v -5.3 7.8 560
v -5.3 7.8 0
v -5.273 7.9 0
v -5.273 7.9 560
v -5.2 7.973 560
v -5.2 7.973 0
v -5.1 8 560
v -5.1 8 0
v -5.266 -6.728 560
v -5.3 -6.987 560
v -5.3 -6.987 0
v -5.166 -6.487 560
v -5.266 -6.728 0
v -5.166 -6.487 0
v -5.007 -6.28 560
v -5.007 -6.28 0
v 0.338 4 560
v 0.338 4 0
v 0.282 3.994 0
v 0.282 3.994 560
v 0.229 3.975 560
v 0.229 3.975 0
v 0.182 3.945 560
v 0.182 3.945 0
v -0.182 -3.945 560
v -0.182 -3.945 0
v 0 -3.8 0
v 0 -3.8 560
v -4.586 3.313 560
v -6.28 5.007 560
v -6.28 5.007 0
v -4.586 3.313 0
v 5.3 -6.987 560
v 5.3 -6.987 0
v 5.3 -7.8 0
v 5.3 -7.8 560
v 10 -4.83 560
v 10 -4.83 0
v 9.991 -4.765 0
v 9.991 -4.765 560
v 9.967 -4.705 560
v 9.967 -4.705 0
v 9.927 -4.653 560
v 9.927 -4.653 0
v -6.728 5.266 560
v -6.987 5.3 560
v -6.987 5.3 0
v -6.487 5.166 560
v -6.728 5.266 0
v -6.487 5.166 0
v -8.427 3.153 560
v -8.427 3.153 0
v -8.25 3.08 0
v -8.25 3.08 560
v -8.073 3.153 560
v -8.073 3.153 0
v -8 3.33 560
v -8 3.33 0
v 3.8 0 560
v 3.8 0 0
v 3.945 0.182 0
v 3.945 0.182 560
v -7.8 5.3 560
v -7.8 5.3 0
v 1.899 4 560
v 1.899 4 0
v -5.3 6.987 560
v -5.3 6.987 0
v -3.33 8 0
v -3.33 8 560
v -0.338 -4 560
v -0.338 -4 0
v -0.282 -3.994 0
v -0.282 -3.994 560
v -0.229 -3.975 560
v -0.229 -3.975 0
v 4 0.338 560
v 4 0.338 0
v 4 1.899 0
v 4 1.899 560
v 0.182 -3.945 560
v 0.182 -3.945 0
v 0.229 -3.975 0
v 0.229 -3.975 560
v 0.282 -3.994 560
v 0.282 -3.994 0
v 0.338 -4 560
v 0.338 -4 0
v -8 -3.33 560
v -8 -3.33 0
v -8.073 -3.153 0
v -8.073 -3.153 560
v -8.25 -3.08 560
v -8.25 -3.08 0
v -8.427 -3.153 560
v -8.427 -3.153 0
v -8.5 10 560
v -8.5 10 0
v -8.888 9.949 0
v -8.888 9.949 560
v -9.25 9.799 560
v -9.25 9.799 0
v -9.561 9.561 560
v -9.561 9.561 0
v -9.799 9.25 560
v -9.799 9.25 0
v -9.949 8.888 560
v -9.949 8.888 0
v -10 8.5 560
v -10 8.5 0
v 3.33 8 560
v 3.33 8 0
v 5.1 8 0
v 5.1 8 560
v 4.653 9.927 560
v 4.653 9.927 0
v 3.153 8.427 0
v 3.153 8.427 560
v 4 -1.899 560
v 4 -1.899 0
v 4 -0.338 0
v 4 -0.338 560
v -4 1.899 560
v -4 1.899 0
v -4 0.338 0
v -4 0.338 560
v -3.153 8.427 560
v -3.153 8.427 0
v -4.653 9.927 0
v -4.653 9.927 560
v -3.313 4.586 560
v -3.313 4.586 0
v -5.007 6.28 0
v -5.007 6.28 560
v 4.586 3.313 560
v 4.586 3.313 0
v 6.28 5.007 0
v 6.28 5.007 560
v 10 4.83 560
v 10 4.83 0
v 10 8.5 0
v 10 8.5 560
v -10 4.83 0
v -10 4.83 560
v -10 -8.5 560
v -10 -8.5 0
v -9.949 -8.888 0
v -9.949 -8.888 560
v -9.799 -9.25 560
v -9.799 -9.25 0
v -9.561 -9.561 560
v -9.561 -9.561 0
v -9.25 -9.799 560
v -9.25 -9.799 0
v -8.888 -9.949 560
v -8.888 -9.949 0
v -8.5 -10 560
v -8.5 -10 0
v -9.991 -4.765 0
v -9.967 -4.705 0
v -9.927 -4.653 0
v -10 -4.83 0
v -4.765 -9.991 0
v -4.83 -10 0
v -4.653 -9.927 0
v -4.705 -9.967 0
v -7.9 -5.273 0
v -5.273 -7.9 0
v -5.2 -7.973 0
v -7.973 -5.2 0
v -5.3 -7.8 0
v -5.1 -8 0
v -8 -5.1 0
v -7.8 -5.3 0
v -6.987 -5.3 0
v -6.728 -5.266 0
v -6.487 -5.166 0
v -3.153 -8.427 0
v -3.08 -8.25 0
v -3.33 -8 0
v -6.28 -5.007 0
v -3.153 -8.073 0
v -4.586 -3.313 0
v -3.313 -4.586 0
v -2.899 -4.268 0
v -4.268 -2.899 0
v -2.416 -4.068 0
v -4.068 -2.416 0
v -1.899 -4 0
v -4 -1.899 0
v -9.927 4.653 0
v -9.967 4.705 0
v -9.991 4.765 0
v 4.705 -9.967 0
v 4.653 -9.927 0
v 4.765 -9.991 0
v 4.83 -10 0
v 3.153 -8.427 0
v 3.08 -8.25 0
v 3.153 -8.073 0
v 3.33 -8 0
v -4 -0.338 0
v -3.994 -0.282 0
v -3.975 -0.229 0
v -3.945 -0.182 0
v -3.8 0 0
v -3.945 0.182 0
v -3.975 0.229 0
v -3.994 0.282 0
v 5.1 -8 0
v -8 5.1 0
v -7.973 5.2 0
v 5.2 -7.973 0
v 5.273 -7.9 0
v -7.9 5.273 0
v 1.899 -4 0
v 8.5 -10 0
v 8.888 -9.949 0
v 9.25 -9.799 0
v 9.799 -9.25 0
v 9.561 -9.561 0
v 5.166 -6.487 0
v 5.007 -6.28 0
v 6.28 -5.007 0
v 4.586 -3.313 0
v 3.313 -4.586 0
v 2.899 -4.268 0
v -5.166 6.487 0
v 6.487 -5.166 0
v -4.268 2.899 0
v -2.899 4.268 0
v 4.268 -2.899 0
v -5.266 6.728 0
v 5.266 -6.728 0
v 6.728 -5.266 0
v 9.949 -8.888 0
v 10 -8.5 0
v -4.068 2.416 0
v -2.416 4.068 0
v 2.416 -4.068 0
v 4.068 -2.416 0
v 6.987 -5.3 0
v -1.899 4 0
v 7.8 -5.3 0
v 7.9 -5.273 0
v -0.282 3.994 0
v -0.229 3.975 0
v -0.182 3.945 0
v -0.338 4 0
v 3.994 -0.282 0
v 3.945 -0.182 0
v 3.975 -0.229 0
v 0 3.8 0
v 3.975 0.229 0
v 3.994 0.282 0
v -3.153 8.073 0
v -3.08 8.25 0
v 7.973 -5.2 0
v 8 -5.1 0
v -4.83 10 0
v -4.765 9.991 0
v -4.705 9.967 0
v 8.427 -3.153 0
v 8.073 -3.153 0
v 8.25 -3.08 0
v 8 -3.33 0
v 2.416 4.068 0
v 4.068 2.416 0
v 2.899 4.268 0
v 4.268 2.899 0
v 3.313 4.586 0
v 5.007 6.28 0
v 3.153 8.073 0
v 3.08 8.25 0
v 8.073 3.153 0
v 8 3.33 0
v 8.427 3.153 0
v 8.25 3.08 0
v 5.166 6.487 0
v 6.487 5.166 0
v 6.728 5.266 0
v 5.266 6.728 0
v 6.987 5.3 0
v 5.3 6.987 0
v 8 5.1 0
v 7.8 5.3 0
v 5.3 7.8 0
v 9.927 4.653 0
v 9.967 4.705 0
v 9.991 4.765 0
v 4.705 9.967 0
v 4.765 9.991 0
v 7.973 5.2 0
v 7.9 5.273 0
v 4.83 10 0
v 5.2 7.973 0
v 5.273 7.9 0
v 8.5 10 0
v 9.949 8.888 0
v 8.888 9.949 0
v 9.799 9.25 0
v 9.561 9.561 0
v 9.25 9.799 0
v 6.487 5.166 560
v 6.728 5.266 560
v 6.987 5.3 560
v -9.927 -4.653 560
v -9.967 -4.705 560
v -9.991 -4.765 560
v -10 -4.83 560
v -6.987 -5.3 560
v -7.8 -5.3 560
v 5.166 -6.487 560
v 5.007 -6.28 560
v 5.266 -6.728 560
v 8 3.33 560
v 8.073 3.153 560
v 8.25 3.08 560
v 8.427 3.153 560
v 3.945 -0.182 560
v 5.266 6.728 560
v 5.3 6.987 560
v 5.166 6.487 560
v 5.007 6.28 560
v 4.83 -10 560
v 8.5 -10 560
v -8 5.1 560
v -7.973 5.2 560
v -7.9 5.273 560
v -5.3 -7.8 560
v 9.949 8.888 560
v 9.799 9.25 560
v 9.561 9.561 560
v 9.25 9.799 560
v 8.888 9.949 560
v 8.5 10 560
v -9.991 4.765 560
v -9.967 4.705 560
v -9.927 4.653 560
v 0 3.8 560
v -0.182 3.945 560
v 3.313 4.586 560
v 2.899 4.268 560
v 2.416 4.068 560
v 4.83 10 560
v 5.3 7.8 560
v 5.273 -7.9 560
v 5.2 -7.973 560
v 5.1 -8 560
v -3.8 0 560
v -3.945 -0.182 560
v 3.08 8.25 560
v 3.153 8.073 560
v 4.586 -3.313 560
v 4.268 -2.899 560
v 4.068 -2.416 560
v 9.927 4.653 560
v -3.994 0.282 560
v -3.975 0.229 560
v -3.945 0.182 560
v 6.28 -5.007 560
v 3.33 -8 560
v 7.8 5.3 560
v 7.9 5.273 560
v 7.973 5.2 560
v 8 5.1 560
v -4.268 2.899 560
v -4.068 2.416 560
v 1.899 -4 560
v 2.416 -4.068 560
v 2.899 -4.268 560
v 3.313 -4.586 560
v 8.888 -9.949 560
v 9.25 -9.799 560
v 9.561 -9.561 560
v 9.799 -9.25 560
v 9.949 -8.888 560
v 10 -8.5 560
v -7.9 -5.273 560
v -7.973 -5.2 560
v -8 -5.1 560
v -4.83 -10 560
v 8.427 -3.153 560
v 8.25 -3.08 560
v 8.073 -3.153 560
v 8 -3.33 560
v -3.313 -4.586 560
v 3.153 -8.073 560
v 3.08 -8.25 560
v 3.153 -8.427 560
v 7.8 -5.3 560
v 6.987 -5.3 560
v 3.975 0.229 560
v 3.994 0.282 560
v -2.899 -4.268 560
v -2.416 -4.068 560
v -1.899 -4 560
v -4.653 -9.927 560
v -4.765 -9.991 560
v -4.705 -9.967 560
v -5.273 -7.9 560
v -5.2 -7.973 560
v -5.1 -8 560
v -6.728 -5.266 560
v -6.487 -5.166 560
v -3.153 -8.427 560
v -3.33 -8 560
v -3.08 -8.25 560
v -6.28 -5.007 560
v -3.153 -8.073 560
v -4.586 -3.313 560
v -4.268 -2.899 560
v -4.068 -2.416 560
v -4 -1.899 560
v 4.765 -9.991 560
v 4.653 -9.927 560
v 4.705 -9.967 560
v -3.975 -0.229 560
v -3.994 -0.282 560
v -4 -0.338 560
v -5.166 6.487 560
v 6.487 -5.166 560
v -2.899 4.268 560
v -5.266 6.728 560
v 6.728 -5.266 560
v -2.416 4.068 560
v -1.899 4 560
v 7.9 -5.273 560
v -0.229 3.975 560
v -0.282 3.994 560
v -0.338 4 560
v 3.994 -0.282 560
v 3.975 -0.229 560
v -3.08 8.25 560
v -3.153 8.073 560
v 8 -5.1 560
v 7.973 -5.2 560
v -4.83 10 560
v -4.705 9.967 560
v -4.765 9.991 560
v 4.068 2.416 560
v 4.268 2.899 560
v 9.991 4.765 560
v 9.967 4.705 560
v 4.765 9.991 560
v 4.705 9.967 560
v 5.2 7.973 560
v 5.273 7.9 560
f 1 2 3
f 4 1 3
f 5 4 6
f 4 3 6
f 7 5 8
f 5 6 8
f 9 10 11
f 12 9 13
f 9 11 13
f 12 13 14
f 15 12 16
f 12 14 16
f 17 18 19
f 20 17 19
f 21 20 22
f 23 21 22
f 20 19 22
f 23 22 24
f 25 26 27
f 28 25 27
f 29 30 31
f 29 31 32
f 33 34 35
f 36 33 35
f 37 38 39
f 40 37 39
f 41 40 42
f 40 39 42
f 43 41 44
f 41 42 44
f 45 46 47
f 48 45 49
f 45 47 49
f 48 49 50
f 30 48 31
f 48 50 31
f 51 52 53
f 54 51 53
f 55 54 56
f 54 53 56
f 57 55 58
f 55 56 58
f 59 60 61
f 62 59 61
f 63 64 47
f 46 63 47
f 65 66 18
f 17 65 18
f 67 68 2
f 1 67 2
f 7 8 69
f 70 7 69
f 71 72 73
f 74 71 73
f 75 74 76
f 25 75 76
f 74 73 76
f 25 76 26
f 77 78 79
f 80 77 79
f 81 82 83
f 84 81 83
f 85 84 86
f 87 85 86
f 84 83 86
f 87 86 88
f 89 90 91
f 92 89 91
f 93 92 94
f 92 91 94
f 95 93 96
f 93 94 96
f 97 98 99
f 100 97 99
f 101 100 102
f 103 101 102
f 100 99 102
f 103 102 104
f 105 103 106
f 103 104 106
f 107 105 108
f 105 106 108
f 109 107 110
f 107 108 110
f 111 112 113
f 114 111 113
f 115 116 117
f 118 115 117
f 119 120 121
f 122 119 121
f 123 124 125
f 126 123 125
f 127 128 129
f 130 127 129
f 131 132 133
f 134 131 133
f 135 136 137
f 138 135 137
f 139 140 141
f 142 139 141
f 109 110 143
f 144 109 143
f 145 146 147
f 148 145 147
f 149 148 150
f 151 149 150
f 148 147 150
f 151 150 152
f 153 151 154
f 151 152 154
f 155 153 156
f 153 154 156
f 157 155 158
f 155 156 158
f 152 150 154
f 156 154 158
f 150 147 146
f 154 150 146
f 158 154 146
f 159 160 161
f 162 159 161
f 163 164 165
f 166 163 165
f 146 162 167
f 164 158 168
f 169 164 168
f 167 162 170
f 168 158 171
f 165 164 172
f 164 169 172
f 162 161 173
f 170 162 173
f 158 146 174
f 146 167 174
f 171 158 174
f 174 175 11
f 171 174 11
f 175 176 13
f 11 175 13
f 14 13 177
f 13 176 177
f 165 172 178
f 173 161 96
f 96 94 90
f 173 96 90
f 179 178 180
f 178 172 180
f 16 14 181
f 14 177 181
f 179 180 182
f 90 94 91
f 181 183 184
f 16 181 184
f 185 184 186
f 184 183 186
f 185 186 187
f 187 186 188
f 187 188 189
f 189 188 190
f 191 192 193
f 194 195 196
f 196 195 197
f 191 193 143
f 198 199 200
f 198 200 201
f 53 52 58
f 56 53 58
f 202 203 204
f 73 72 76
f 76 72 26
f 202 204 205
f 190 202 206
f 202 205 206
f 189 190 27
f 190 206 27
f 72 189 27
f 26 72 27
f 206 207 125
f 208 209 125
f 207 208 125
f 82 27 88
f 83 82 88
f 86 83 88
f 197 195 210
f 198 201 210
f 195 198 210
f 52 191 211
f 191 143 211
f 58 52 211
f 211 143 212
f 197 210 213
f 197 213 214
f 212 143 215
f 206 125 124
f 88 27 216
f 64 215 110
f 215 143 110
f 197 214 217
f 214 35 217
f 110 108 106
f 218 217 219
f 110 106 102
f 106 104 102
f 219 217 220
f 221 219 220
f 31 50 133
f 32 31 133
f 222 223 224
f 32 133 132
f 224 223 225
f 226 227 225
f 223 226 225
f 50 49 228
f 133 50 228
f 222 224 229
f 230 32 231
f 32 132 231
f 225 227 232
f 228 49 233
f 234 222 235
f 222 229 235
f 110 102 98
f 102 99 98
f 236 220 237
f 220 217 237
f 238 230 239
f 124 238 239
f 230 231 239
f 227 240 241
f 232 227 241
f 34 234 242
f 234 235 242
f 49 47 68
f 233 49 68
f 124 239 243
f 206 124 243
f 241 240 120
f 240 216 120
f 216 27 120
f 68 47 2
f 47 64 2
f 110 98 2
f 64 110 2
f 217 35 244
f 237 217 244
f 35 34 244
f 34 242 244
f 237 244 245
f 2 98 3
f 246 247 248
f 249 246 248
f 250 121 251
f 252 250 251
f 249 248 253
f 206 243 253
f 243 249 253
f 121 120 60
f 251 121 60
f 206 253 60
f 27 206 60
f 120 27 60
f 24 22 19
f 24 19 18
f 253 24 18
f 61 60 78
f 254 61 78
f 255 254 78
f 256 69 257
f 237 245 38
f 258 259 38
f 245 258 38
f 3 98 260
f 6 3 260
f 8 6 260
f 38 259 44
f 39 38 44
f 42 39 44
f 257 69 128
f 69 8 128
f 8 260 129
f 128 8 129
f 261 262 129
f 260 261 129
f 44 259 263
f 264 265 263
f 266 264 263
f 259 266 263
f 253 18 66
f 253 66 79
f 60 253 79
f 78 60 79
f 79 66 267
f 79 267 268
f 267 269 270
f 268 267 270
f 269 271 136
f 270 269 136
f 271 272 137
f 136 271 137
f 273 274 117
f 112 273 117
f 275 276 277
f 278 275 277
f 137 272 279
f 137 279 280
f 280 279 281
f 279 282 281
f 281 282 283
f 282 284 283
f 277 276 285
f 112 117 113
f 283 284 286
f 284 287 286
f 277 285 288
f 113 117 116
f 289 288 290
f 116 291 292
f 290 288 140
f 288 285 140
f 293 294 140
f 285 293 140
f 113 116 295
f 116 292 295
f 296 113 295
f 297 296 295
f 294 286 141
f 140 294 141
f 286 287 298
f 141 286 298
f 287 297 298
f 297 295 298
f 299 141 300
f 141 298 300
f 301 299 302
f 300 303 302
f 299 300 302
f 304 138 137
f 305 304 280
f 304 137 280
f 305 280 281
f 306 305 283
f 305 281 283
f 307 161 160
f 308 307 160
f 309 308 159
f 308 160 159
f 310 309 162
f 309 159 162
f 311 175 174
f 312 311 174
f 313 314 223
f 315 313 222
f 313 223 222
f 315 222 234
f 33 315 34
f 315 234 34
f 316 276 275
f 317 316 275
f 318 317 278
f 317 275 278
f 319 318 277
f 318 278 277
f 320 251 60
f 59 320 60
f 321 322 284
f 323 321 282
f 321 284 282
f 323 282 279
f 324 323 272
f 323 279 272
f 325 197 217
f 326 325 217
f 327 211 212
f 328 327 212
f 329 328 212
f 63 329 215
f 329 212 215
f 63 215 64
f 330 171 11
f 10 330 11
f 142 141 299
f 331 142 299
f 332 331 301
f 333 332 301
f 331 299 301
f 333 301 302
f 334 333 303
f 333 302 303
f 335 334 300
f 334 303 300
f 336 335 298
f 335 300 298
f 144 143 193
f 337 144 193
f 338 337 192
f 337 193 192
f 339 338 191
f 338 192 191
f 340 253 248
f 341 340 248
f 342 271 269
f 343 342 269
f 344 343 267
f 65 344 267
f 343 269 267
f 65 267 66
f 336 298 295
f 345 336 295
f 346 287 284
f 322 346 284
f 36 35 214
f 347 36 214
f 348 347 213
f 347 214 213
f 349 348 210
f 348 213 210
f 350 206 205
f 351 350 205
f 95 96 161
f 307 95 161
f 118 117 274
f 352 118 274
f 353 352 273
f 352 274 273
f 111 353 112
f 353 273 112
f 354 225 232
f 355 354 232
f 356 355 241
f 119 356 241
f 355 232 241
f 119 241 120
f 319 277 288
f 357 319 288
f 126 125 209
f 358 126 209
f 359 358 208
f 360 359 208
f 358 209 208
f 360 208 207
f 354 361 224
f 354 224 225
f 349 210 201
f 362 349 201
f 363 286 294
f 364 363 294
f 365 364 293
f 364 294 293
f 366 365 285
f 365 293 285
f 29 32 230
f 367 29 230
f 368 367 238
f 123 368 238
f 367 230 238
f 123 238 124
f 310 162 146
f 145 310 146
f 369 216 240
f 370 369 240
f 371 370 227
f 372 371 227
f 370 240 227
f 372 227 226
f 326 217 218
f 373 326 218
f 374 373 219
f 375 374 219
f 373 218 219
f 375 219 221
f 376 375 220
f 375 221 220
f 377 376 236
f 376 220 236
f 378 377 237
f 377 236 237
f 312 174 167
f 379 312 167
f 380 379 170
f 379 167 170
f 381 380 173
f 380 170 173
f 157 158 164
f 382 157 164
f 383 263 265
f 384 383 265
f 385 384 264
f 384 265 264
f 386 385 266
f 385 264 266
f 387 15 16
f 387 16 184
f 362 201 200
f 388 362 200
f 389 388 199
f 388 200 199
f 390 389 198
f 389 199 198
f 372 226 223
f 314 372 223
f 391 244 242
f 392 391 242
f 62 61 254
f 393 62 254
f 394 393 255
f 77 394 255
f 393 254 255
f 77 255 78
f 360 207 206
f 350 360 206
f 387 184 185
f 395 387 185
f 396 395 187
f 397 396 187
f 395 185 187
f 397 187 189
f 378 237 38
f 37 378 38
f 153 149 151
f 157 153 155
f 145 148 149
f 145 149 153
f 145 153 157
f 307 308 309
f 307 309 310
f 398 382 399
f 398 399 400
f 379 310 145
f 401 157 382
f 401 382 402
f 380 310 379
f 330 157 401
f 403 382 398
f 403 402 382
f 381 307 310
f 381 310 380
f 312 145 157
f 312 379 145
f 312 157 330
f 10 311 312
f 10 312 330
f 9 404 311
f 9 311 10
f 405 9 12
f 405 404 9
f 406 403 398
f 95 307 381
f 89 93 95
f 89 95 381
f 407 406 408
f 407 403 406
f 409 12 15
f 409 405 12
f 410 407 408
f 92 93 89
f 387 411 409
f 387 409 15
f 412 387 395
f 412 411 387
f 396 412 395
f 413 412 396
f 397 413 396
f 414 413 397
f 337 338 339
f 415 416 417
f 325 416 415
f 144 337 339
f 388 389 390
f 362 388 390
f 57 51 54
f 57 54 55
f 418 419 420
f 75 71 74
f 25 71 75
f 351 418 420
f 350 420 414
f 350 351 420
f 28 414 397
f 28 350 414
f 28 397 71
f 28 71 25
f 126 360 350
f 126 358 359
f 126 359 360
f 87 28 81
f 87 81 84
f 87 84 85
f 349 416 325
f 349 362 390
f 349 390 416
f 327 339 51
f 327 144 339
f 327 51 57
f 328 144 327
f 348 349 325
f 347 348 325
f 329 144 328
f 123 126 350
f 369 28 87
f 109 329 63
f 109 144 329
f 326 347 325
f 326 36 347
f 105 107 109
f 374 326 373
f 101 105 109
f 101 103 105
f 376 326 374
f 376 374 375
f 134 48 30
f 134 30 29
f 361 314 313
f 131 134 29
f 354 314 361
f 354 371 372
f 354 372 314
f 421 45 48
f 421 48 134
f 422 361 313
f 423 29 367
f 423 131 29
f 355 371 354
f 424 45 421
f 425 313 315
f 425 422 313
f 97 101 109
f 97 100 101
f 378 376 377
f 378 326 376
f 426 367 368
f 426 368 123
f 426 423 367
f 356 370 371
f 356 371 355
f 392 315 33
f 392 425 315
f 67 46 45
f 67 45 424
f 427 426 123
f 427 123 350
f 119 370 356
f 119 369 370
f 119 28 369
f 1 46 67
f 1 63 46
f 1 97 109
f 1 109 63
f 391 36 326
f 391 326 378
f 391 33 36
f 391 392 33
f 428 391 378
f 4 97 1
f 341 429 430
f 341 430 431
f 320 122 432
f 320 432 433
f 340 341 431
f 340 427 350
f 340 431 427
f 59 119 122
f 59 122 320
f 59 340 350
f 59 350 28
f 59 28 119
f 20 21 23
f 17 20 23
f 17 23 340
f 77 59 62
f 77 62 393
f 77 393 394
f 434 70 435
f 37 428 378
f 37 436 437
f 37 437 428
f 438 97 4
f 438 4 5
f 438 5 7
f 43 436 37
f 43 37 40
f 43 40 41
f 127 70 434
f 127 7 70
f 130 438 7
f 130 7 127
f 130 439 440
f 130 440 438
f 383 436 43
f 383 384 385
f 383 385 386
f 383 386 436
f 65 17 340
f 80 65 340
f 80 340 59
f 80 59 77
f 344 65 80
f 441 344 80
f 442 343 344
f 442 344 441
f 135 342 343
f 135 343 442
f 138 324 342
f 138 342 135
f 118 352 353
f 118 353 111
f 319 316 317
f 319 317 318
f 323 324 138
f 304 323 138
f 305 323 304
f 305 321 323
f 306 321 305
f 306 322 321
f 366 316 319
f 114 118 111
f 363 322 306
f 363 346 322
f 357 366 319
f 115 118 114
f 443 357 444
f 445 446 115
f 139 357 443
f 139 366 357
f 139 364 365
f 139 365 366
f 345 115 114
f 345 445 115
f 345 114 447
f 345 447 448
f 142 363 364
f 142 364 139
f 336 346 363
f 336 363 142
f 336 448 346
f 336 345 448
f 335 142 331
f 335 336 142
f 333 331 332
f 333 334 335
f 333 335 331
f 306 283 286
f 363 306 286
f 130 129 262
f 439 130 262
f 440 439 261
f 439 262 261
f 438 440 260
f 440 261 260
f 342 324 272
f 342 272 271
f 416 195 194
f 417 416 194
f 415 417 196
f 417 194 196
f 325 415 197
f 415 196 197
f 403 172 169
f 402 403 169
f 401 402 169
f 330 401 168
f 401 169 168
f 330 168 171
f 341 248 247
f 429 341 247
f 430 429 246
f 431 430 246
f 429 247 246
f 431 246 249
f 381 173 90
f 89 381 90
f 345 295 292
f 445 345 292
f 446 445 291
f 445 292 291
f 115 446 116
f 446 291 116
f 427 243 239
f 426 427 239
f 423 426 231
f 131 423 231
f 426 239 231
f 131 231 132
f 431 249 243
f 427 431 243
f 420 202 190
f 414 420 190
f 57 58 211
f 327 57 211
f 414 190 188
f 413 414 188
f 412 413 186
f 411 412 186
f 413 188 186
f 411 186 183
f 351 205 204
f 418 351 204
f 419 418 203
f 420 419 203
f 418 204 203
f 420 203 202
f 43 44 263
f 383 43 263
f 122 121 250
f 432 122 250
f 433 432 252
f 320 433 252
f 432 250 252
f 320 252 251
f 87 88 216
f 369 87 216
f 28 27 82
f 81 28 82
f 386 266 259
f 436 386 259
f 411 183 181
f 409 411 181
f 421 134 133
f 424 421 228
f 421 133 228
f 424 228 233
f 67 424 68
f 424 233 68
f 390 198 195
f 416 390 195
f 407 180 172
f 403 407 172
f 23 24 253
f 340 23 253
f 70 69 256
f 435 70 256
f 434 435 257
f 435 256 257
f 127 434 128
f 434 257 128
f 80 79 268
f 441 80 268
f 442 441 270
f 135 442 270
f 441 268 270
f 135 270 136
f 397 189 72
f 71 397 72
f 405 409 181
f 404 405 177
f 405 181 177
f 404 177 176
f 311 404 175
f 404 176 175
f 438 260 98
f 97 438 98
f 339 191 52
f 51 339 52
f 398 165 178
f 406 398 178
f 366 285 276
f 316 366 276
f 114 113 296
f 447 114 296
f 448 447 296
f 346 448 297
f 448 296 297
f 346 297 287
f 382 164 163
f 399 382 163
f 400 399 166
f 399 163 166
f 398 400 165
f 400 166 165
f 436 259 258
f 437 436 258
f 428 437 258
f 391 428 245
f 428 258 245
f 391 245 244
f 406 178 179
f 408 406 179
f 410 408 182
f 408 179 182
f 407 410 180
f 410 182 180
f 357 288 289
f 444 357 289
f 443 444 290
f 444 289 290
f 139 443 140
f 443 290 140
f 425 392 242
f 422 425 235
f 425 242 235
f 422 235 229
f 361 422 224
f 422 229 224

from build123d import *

# Parameters (mm, degrees)
EXTRUDE_1_DEPTH = 560


# Read off the part's stored shape, not the designer's step: 222 Конструкционный профиль 20х20-1-surface1
with BuildPart() as part:
    # Эскиз1 → Бобышка-Вытянуть1 (new body)
    with BuildSketch(Plane.XY):
        with BuildLine():
            Line((-3.945217202, 0.181521503), (-3.8, 0))
            Line((-3.8, 0), (-3.945217202, -0.181521503))
            ThreePointArc((-3.945217202, -0.181521503), (-3.98590708, -0.254943529), (-4, -0.337695265))
            Line((-4, -0.337695265), (-4, -1.898780669))
            ThreePointArc((-4, -1.898780669), (-4.152240935, -2.664147534), (-4.585786438, -3.312994231))
            Line((-4.585786438, -3.312994231), (-6.279898987, -5.007106781))
            ThreePointArc((-6.279898987, -5.007106781), (-6.604322336, -5.223879533), (-6.987005769, -5.3))
            Line((-6.987005769, -5.3), (-7.8, -5.3))
            ThreePointArc((-7.8, -5.3), (-7.941421356, -5.241421356), (-8, -5.1))
            Line((-8, -5.1), (-8, -3.33))
            ThreePointArc((-8, -3.33), (-8.154329142, -3.099030117), (-8.426776695, -3.153223305))
            Line((-8.426776695, -3.153223305), (-9.926776695, -4.653223305))
            ThreePointArc((-9.926776695, -4.653223305), (-9.980969883, -4.734329142), (-10, -4.83))
            Line((-10, -4.83), (-10, -8.5))
            ThreePointArc((-10, -8.5), (-9.560660172, -9.560660172), (-8.5, -10))
            Line((-8.5, -10), (-4.83, -10))
            ThreePointArc((-4.83, -10), (-4.734329142, -9.980969883), (-4.653223305, -9.926776695))
            Line((-4.653223305, -9.926776695), (-3.153223305, -8.426776695))
            ThreePointArc((-3.153223305, -8.426776695), (-3.099030117, -8.154329142), (-3.33, -8))
            Line((-3.33, -8), (-5.1, -8))
            ThreePointArc((-5.1, -8), (-5.241421356, -7.941421356), (-5.3, -7.8))
            Line((-5.3, -7.8), (-5.3, -6.987005769))
            ThreePointArc((-5.3, -6.987005769), (-5.223879533, -6.604322336), (-5.007106781, -6.279898987))
            Line((-5.007106781, -6.279898987), (-3.312994231, -4.585786438))
            ThreePointArc((-3.312994231, -4.585786438), (-2.664147534, -4.152240935), (-1.898780669, -4))
            Line((-1.898780669, -4), (-0.337695265, -4))
            ThreePointArc((-0.337695265, -4), (-0.254943529, -3.98590708), (-0.181521503, -3.945217202))
            Line((-0.181521503, -3.945217202), (0, -3.8))
            Line((0, -3.8), (0.181521503, -3.945217202))
            ThreePointArc((0.181521503, -3.945217202), (0.254943529, -3.98590708), (0.337695265, -4))
            Line((0.337695265, -4), (1.898780669, -4))
            ThreePointArc((1.898780669, -4), (2.664147534, -4.152240935), (3.312994231, -4.585786438))
            Line((3.312994231, -4.585786438), (5.007106781, -6.279898987))
            ThreePointArc((5.007106781, -6.279898987), (5.223879533, -6.604322336), (5.3, -6.987005769))
            Line((5.3, -6.987005769), (5.3, -7.8))
            ThreePointArc((5.3, -7.8), (5.241421356, -7.941421356), (5.1, -8))
            Line((5.1, -8), (3.33, -8))
            ThreePointArc((3.33, -8), (3.099030117, -8.154329142), (3.153223305, -8.426776695))
            Line((3.153223305, -8.426776695), (4.653223305, -9.926776695))
            ThreePointArc((4.653223305, -9.926776695), (4.734329142, -9.980969883), (4.83, -10))
            Line((4.83, -10), (8.5, -10))
            ThreePointArc((8.5, -10), (9.560660172, -9.560660172), (10, -8.5))
            Line((10, -8.5), (10, -4.83))
            ThreePointArc((10, -4.83), (9.980969883, -4.734329142), (9.926776695, -4.653223305))
            Line((9.926776695, -4.653223305), (8.426776695, -3.153223305))
            ThreePointArc((8.426776695, -3.153223305), (8.154329142, -3.099030117), (8, -3.33))
            Line((8, -3.33), (8, -5.1))
            ThreePointArc((8, -5.1), (7.941421356, -5.241421356), (7.8, -5.3))
            Line((7.8, -5.3), (6.987005769, -5.3))
            ThreePointArc((6.987005769, -5.3), (6.604322336, -5.223879533), (6.279898987, -5.007106781))
            Line((6.279898987, -5.007106781), (4.585786438, -3.312994231))
            ThreePointArc((4.585786438, -3.312994231), (4.152240935, -2.664147534), (4, -1.898780669))
            Line((4, -1.898780669), (4, -0.337695265))
            ThreePointArc((4, -0.337695265), (3.98590708, -0.254943529), (3.945217202, -0.181521503))
            Line((3.945217202, -0.181521503), (3.8, 0))
            Line((3.8, 0), (3.945217202, 0.181521503))
            ThreePointArc((3.945217202, 0.181521503), (3.98590708, 0.254943529), (4, 0.337695265))
            Line((4, 0.337695265), (4, 1.898780669))
            ThreePointArc((4, 1.898780669), (4.152240935, 2.664147534), (4.585786438, 3.312994231))
            Line((4.585786438, 3.312994231), (6.279898987, 5.007106781))
            ThreePointArc((6.279898987, 5.007106781), (6.604322336, 5.223879533), (6.987005769, 5.3))
            Line((6.987005769, 5.3), (7.8, 5.3))
            ThreePointArc((7.8, 5.3), (7.941421356, 5.241421356), (8, 5.1))
            Line((8, 5.1), (8, 3.33))
            ThreePointArc((8, 3.33), (8.154329142, 3.099030117), (8.426776695, 3.153223305))
            Line((8.426776695, 3.153223305), (9.926776695, 4.653223305))
            ThreePointArc((9.926776695, 4.653223305), (9.980969883, 4.734329142), (10, 4.83))
            Line((10, 4.83), (10, 8.5))
            ThreePointArc((10, 8.5), (9.560660172, 9.560660172), (8.5, 10))
            Line((8.5, 10), (4.83, 10))
            ThreePointArc((4.83, 10), (4.734329142, 9.980969883), (4.653223305, 9.926776695))
            Line((4.653223305, 9.926776695), (3.153223305, 8.426776695))
            ThreePointArc((3.153223305, 8.426776695), (3.099030117, 8.154329142), (3.33, 8))
            Line((3.33, 8), (5.1, 8))
            ThreePointArc((5.1, 8), (5.241421356, 7.941421356), (5.3, 7.8))
            Line((5.3, 7.8), (5.3, 6.987005769))
            ThreePointArc((5.3, 6.987005769), (5.223879533, 6.604322336), (5.007106781, 6.279898987))
            Line((5.007106781, 6.279898987), (3.312994231, 4.585786438))
            ThreePointArc((3.312994231, 4.585786438), (2.664147534, 4.152240935), (1.898780669, 4))
            Line((1.898780669, 4), (0.337695265, 4))
            ThreePointArc((0.337695265, 4), (0.254943529, 3.98590708), (0.181521503, 3.945217202))
            Line((0.181521503, 3.945217202), (0, 3.8))
            Line((0, 3.8), (-0.181521503, 3.945217202))
            ThreePointArc((-0.181521503, 3.945217202), (-0.254943529, 3.98590708), (-0.337695265, 4))
            Line((-0.337695265, 4), (-1.898780669, 4))
            ThreePointArc((-1.898780669, 4), (-2.664147534, 4.152240935), (-3.312994231, 4.585786438))
            Line((-3.312994231, 4.585786438), (-5.007106781, 6.279898987))
            ThreePointArc((-5.007106781, 6.279898987), (-5.223879533, 6.604322336), (-5.3, 6.987005769))
            Line((-5.3, 6.987005769), (-5.3, 7.8))
            ThreePointArc((-5.3, 7.8), (-5.241421356, 7.941421356), (-5.1, 8))
            Line((-5.1, 8), (-3.33, 8))
            ThreePointArc((-3.33, 8), (-3.099030117, 8.154329142), (-3.153223305, 8.426776695))
            Line((-3.153223305, 8.426776695), (-4.653223305, 9.926776695))
            ThreePointArc((-4.653223305, 9.926776695), (-4.734329142, 9.980969883), (-4.83, 10))
            Line((-4.83, 10), (-8.5, 10))
            ThreePointArc((-8.5, 10), (-9.560660172, 9.560660172), (-10, 8.5))
            Line((-10, 8.5), (-10, 4.83))
            ThreePointArc((-10, 4.83), (-9.980969883, 4.734329142), (-9.926776695, 4.653223305))
            Line((-9.926776695, 4.653223305), (-8.426776695, 3.153223305))
            ThreePointArc((-8.426776695, 3.153223305), (-8.154329142, 3.099030117), (-8, 3.33))
            Line((-8, 3.33), (-8, 5.1))
            ThreePointArc((-8, 5.1), (-7.941421356, 5.241421356), (-7.8, 5.3))
            Line((-7.8, 5.3), (-6.987005769, 5.3))
            ThreePointArc((-6.987005769, 5.3), (-6.604322336, 5.223879533), (-6.279898987, 5.007106781))
            Line((-6.279898987, 5.007106781), (-4.585786438, 3.312994231))
            ThreePointArc((-4.585786438, 3.312994231), (-4.152240935, 2.664147534), (-4, 1.898780669))
            Line((-4, 1.898780669), (-4, 0.337695265))
            ThreePointArc((-4, 0.337695265), (-3.98590708, 0.254943529), (-3.945217202, 0.181521503))
        make_face()
    extrude(amount=EXTRUDE_1_DEPTH)


solid = part.part
